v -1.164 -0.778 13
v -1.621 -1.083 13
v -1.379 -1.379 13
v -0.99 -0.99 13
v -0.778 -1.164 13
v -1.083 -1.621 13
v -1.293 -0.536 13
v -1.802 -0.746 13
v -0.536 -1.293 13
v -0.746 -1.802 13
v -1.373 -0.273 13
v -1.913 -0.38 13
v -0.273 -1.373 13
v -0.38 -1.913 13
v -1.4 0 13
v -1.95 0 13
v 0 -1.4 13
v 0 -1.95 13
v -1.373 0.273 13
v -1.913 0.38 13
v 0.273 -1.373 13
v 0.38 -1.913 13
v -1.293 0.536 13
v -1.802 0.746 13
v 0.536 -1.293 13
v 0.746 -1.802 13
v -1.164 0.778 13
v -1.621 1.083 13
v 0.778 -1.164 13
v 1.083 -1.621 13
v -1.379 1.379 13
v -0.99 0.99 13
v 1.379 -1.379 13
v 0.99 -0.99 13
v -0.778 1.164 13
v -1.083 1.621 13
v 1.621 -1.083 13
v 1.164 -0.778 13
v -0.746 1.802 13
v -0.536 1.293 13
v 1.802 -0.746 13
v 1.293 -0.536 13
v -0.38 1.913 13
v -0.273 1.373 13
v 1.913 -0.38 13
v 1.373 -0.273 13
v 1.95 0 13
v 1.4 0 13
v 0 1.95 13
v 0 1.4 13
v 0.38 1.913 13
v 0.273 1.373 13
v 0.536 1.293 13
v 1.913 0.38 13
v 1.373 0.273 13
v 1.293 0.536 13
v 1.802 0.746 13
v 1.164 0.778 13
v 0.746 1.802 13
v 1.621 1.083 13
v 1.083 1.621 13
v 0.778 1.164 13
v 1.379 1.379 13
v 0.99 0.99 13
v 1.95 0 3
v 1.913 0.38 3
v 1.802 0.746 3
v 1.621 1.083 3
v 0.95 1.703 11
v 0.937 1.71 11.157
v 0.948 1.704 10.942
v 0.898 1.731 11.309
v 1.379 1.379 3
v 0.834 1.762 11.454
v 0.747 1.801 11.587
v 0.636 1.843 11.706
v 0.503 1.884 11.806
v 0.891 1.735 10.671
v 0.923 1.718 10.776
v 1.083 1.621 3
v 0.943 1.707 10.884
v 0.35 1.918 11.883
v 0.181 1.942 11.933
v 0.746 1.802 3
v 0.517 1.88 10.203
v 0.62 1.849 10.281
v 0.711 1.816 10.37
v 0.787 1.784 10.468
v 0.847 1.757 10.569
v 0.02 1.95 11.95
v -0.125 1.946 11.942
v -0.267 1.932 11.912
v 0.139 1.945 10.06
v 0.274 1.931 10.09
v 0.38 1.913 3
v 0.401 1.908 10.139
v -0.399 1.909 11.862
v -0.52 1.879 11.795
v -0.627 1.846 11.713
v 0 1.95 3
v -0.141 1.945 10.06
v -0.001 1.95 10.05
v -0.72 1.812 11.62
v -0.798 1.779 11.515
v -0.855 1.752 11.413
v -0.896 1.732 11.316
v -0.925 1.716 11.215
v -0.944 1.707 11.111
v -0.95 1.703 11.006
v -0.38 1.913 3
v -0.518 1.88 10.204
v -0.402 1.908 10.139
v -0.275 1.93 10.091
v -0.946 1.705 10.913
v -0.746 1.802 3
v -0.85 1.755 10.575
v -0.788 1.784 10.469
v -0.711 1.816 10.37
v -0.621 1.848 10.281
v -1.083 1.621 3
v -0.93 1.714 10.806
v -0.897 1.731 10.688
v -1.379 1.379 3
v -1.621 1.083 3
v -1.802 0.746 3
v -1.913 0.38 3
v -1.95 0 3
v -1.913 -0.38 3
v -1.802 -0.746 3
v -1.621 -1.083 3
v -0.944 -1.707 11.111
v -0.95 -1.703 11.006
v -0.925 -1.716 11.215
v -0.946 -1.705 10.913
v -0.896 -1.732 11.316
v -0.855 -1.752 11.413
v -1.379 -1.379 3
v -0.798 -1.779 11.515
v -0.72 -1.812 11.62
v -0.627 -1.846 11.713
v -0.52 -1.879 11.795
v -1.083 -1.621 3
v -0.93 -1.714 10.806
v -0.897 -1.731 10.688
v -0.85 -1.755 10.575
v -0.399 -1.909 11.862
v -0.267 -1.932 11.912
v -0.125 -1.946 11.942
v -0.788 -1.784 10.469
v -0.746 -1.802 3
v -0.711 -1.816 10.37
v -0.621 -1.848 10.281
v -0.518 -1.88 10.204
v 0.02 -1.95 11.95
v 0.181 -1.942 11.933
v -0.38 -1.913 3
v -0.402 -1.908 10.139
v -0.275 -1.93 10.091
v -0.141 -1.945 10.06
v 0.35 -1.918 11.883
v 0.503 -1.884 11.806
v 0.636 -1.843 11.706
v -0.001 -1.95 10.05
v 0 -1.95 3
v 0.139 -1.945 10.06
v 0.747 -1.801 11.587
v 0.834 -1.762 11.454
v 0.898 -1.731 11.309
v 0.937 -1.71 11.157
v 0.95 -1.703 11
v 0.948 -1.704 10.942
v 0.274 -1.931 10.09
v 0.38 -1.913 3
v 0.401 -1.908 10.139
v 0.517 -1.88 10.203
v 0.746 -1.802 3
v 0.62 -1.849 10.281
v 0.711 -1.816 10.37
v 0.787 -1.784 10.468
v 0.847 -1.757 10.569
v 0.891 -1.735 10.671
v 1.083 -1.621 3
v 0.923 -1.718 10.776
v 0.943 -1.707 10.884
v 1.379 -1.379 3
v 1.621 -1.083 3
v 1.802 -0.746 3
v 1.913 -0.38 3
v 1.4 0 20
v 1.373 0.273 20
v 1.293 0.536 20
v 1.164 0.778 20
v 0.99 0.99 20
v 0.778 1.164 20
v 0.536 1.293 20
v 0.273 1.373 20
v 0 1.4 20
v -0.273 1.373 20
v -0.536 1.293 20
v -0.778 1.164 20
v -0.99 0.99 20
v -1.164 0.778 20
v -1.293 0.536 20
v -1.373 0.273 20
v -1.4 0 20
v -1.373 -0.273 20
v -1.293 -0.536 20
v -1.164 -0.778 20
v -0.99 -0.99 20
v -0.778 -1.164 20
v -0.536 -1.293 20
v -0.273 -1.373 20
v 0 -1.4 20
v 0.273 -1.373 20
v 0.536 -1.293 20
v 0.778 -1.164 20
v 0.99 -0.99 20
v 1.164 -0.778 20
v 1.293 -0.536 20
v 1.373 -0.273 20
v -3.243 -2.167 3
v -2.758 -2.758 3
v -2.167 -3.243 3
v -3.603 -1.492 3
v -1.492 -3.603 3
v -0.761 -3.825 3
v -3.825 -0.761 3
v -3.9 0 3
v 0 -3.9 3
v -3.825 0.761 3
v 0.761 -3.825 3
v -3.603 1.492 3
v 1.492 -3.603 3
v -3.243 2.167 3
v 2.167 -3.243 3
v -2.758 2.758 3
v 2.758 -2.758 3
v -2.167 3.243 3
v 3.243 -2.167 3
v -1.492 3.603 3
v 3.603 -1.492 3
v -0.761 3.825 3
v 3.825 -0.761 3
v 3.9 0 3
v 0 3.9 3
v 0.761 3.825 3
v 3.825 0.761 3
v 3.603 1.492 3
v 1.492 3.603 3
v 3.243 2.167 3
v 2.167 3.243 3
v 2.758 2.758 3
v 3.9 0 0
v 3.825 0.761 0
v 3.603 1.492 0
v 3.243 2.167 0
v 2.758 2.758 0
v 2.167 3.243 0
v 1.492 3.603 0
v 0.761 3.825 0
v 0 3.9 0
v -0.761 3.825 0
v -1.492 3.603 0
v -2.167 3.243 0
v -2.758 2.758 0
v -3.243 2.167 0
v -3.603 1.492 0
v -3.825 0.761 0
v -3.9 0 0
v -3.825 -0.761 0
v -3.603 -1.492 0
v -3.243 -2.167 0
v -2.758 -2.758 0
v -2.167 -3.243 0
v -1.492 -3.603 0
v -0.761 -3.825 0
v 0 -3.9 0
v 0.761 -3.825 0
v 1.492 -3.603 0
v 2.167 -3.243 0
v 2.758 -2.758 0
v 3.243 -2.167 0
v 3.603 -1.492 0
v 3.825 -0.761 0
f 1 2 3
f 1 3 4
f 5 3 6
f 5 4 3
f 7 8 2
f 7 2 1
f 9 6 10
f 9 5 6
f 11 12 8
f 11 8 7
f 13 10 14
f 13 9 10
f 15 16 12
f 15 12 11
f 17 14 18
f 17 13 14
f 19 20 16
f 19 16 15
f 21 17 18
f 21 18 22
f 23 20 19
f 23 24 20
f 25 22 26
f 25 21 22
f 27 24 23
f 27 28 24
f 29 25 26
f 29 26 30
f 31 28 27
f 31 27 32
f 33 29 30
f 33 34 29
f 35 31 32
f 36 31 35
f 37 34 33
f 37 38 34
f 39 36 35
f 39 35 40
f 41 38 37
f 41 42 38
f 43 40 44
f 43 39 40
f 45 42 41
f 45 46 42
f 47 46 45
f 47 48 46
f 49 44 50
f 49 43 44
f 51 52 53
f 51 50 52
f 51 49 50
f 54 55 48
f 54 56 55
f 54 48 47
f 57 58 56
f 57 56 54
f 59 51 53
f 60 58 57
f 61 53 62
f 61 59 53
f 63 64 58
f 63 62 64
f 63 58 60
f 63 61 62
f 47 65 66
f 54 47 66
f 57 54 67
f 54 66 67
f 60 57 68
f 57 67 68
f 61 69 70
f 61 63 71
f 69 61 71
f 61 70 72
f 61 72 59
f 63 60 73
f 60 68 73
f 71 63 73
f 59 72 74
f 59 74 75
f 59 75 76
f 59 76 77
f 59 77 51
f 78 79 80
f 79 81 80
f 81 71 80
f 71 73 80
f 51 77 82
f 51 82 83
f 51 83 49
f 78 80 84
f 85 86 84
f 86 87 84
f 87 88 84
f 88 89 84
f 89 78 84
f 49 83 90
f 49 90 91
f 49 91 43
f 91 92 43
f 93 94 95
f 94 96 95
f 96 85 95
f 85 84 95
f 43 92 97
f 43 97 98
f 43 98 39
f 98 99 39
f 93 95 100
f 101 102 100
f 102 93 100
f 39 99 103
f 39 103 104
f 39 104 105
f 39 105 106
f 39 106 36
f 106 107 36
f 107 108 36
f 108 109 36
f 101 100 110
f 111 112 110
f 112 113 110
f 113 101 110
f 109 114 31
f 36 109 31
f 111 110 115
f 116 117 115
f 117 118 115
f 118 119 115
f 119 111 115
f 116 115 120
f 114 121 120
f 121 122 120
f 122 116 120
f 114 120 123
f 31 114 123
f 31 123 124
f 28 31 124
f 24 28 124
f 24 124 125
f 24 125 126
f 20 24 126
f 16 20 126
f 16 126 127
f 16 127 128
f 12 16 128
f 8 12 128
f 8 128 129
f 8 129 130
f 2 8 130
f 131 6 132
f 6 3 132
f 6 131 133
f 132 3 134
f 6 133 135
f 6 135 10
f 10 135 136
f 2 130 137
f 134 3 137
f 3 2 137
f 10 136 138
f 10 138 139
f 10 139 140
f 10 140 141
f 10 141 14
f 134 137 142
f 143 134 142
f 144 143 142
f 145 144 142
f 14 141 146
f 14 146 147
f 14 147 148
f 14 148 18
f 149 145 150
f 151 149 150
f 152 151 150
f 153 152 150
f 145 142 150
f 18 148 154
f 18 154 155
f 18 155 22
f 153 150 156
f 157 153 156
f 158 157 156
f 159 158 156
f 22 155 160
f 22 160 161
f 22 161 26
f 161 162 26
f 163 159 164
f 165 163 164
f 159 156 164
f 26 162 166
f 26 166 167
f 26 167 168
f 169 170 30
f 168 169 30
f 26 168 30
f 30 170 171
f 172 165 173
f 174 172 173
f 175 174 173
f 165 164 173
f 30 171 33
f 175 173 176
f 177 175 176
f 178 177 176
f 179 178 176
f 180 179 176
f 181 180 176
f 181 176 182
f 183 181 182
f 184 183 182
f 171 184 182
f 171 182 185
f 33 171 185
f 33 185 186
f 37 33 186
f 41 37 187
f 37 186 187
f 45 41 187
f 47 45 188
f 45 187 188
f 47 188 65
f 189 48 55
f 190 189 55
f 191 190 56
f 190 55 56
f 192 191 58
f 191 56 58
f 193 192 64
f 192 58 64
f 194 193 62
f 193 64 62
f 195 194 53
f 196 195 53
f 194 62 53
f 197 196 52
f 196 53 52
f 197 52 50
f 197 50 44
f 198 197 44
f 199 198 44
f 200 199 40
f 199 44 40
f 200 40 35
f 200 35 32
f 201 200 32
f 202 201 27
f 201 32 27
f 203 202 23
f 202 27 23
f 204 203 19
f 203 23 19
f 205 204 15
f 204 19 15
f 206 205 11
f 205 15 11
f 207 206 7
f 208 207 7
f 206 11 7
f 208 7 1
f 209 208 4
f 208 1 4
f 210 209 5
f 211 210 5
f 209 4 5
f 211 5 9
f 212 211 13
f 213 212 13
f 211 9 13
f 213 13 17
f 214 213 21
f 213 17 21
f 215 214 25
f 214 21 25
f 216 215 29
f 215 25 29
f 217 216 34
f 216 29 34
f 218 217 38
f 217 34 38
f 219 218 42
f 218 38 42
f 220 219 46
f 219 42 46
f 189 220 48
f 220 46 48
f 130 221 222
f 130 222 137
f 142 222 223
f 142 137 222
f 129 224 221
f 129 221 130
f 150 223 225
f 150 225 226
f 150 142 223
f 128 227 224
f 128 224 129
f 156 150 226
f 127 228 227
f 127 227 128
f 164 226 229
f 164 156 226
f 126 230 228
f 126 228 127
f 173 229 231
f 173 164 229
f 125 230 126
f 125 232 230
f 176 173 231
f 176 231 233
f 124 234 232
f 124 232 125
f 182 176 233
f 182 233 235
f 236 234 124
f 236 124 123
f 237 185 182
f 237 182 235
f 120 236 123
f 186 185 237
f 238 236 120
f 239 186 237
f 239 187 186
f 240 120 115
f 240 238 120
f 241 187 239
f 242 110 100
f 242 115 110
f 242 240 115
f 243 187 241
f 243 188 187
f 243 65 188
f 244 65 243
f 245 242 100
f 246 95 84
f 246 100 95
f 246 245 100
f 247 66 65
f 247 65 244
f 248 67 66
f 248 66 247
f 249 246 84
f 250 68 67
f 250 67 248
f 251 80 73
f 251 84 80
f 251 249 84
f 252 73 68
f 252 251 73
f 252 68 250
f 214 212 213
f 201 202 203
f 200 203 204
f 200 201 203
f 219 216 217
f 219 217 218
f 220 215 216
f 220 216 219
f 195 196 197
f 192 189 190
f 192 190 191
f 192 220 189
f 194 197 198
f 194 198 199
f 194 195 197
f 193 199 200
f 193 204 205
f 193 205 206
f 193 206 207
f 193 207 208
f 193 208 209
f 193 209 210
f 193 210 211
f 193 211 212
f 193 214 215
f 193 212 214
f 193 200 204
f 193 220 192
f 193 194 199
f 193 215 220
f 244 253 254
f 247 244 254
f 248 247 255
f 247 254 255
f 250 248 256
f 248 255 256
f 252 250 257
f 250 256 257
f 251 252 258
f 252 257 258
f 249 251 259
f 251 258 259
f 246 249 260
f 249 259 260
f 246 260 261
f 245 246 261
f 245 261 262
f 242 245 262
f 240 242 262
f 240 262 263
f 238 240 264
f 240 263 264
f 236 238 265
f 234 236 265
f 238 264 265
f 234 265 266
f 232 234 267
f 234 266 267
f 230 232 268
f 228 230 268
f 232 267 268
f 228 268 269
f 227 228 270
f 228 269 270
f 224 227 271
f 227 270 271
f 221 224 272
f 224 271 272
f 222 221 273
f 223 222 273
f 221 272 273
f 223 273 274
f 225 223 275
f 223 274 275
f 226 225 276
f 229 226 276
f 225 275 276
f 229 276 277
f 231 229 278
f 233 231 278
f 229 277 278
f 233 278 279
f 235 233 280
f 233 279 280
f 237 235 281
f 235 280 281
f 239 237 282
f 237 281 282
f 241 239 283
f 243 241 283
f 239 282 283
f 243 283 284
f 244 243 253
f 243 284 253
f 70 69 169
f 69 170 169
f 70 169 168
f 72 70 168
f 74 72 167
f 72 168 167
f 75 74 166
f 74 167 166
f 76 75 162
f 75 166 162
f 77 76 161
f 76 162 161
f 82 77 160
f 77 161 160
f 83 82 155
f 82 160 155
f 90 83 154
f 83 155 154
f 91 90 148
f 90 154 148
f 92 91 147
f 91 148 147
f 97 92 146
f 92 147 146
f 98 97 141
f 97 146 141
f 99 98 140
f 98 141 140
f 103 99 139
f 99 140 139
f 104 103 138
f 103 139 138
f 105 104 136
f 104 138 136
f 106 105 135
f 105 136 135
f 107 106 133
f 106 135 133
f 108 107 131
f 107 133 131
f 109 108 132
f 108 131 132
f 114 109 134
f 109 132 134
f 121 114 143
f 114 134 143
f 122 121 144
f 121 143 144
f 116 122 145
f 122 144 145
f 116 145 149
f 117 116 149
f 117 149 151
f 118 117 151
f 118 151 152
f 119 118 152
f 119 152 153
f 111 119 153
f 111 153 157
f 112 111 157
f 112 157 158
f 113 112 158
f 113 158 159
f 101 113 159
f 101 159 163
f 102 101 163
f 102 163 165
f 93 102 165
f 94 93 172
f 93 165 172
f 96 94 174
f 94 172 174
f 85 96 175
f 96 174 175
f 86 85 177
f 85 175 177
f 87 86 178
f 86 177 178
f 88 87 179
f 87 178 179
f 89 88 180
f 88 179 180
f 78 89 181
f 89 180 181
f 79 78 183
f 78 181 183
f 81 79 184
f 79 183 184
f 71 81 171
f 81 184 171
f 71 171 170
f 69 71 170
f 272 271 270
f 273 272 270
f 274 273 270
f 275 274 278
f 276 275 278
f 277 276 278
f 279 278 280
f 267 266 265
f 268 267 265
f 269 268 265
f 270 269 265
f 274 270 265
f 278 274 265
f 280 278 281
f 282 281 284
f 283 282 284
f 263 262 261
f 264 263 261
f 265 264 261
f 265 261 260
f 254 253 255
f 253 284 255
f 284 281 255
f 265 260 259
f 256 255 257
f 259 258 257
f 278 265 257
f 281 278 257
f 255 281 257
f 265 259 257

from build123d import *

# Parameters (mm, degrees)
F0_R      = 3.9
F1_DEPTH  = 3
F3_R      = 1.95
F4_DEPTH  = 10
F7_R      = 1.4
F8_DEPTH  = 7
F5_R      = 0.95
F9_DEPTH  = 4.8
F10_DEPTH = 4.8


with BuildPart() as f1:
    # F0 (on Top) → F1 (new body)
    with BuildSketch(Plane.XY):
        Circle(F0_R)
    extrude(amount=F1_DEPTH)

    # F3 (on offset) → F4 (join)
    with BuildSketch(Plane.XY.offset(3)):
        Circle(F3_R)
    extrude(amount=F4_DEPTH)

    # F7 (on offset) → F8 (join)
    with BuildSketch(Plane.XY.offset(13)):
        Circle(F7_R)
    extrude(amount=F8_DEPTH)

    # F5 (on Front) → F9 (cut)
    with BuildSketch(Plane.XZ):
        with Locations((0, 11)):
            Circle(F5_R)
    extrude(amount=F9_DEPTH, mode=Mode.SUBTRACT)

    # F5 (on Front) → F10 (cut)
    with BuildSketch(Plane.XZ):
        with Locations((0, 11)):
            Circle(F5_R)
    extrude(amount=-F10_DEPTH, mode=Mode.SUBTRACT)


solid = f1.part
